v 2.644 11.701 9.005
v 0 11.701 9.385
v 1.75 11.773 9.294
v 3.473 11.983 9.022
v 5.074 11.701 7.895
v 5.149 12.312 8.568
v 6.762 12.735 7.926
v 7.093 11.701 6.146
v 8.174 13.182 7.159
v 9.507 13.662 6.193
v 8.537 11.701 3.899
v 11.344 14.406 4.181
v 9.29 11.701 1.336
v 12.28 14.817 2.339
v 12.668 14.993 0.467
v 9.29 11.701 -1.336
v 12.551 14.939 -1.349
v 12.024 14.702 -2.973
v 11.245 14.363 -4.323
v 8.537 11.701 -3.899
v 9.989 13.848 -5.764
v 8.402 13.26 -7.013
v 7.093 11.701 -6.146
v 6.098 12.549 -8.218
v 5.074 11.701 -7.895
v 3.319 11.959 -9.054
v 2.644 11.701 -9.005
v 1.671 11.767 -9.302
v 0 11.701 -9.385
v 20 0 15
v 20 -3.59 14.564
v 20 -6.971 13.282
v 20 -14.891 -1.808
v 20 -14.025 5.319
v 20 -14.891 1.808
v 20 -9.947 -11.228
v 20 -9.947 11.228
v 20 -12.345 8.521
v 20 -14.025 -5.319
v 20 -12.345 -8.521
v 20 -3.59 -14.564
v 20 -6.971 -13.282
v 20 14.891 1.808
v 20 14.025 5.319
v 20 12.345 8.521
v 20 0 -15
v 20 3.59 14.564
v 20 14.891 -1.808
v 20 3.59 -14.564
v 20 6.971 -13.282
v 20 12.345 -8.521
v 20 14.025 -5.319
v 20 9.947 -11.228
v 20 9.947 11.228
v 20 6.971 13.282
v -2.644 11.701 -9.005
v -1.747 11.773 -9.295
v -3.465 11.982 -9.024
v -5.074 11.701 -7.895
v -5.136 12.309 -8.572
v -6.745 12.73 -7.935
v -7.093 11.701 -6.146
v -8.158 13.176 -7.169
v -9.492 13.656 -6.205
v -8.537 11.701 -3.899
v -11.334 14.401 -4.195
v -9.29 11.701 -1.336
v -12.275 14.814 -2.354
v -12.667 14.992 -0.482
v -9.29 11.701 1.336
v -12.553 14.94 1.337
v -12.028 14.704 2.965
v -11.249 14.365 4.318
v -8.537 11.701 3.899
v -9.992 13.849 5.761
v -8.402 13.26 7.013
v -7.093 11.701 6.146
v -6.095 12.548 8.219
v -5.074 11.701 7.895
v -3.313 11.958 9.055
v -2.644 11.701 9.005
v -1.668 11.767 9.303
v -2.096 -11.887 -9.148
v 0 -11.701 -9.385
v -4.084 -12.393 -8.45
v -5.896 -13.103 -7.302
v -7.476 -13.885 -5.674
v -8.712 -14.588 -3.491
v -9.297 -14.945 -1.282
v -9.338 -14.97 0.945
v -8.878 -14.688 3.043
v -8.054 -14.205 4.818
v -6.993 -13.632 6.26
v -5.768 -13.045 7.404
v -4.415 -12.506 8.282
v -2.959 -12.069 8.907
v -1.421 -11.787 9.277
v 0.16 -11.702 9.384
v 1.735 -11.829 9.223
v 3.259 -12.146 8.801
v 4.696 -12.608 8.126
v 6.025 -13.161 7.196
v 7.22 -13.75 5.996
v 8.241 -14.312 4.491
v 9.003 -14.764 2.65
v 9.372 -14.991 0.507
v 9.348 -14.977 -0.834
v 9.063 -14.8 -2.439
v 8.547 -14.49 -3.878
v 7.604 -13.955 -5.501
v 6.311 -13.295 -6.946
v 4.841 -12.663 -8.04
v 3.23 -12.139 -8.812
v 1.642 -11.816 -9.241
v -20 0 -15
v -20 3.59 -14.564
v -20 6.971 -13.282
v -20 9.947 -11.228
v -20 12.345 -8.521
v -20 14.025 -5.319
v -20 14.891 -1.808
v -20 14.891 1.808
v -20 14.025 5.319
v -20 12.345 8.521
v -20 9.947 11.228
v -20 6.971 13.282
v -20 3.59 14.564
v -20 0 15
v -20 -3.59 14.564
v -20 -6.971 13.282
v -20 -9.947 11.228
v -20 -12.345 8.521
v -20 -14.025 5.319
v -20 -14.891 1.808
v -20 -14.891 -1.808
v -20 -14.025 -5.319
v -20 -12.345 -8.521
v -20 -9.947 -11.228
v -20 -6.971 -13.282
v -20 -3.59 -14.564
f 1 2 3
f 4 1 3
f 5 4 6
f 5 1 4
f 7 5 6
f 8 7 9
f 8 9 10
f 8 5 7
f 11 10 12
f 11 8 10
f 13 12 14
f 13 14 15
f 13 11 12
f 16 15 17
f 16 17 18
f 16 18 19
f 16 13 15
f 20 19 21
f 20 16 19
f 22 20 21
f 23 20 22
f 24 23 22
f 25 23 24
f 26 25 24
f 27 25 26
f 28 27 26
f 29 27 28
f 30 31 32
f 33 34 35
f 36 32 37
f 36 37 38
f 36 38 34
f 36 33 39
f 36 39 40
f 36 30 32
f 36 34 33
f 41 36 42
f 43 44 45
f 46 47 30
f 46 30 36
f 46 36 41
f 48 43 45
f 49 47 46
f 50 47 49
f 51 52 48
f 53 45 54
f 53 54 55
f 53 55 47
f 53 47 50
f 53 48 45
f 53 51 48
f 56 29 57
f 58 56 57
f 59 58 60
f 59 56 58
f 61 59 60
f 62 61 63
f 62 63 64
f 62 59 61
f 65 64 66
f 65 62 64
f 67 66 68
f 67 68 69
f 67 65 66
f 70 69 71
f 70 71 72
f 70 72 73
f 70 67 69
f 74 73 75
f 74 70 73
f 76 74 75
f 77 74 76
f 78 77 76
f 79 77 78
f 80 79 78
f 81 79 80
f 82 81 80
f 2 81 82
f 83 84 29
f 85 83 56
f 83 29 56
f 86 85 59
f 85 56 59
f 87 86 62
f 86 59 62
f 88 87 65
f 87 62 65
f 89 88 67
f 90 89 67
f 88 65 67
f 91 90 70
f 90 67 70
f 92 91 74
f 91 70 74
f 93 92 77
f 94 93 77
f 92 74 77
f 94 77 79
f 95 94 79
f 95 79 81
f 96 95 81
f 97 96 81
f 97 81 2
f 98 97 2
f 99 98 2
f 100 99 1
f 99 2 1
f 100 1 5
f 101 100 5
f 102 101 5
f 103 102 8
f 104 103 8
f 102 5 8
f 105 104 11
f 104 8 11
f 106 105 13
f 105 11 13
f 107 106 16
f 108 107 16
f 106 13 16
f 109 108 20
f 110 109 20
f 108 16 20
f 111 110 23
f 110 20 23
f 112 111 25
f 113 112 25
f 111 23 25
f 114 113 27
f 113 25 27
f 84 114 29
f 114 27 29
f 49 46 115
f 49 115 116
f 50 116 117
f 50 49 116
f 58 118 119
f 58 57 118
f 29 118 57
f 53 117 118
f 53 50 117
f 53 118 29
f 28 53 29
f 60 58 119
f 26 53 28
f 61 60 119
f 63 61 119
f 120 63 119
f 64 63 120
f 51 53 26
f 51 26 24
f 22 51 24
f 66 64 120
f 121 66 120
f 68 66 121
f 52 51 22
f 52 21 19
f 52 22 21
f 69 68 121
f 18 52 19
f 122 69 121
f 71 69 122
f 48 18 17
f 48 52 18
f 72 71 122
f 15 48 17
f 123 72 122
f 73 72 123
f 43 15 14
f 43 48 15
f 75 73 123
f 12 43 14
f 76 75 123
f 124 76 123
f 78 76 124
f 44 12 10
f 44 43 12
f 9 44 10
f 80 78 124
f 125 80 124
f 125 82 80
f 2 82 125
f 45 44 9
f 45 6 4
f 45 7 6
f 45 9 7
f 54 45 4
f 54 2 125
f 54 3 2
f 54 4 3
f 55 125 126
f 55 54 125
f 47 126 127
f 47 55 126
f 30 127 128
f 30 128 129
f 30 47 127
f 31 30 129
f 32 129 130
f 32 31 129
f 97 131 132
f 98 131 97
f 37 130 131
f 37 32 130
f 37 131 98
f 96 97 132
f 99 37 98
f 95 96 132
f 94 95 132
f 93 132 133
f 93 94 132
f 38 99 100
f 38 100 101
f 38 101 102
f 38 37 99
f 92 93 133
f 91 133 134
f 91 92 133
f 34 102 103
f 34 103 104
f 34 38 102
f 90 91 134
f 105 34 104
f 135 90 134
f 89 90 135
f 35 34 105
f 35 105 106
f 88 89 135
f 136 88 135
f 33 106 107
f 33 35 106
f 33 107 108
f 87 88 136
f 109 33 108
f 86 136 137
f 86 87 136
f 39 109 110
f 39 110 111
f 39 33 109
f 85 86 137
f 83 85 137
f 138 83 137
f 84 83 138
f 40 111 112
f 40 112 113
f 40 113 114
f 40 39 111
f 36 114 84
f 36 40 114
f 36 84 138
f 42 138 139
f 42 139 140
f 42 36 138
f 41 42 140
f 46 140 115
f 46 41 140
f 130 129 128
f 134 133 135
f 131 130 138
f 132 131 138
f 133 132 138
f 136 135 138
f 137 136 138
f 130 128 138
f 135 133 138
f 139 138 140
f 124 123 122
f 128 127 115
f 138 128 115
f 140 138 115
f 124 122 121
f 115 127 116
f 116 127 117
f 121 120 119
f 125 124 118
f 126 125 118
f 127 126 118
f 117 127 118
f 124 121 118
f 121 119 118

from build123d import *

# Parameters (mm, degrees)
SZKIC1_R                    = 15
DODANIE_WYCI_GNI_CIE1_DEPTH = 20
SKETCH1_R                   = 9.385297187
CUT_EXTRUDE1_DEPTH          = 34
CUT_EXTRUDE1_DEPTH_BACK     = 23


with BuildPart() as part:
    # Szkic1 → Dodanie-wyciągnięcie1 (new body, symmetric)
    with BuildSketch(Plane(origin=(0, 0, 0), x_dir=(0, 0, -1), z_dir=(1, 0, 0))):
        Circle(SZKIC1_R)
    extrude(amount=DODANIE_WYCI_GNI_CIE1_DEPTH, both=True)

    # Sketch1 → Cut-Extrude1 (cut, two sides)
    with BuildSketch(Plane(origin=(0, 0, 0), x_dir=(1, 0, 0), z_dir=(0, 1, 0))) as cut_extrude1_sk:
        with Locations(Location((0, 0, 0), (0, 0, 90))):  # turned: the seam where the file's is
            Circle(SKETCH1_R)
    extrude(amount=CUT_EXTRUDE1_DEPTH, mode=Mode.SUBTRACT)
    extrude(cut_extrude1_sk.sketch, amount=-CUT_EXTRUDE1_DEPTH_BACK, mode=Mode.SUBTRACT)

    # Sketch2 → Cut-Revolve1 (revolve, cut)
    with BuildSketch(Plane(origin=(0, 0, 0), x_dir=(0, 0, -1), z_dir=(1, 0, 0)), mode=Mode.PRIVATE) as cut_revolve1_sk:
        Polygon((0, 2.315822277), (0, 32.756739461), (-30.440917184, 32.756739461), align=None)
    revolve(cut_revolve1_sk.sketch.rotate(Axis((0, 2.315822277, 0), (0, 1, 0)), 180), axis=Axis((0, 2.315822277, 0), (0, 1, 0)), mode=Mode.SUBTRACT)  # turned: the seam where the file's is


solid = part.part
